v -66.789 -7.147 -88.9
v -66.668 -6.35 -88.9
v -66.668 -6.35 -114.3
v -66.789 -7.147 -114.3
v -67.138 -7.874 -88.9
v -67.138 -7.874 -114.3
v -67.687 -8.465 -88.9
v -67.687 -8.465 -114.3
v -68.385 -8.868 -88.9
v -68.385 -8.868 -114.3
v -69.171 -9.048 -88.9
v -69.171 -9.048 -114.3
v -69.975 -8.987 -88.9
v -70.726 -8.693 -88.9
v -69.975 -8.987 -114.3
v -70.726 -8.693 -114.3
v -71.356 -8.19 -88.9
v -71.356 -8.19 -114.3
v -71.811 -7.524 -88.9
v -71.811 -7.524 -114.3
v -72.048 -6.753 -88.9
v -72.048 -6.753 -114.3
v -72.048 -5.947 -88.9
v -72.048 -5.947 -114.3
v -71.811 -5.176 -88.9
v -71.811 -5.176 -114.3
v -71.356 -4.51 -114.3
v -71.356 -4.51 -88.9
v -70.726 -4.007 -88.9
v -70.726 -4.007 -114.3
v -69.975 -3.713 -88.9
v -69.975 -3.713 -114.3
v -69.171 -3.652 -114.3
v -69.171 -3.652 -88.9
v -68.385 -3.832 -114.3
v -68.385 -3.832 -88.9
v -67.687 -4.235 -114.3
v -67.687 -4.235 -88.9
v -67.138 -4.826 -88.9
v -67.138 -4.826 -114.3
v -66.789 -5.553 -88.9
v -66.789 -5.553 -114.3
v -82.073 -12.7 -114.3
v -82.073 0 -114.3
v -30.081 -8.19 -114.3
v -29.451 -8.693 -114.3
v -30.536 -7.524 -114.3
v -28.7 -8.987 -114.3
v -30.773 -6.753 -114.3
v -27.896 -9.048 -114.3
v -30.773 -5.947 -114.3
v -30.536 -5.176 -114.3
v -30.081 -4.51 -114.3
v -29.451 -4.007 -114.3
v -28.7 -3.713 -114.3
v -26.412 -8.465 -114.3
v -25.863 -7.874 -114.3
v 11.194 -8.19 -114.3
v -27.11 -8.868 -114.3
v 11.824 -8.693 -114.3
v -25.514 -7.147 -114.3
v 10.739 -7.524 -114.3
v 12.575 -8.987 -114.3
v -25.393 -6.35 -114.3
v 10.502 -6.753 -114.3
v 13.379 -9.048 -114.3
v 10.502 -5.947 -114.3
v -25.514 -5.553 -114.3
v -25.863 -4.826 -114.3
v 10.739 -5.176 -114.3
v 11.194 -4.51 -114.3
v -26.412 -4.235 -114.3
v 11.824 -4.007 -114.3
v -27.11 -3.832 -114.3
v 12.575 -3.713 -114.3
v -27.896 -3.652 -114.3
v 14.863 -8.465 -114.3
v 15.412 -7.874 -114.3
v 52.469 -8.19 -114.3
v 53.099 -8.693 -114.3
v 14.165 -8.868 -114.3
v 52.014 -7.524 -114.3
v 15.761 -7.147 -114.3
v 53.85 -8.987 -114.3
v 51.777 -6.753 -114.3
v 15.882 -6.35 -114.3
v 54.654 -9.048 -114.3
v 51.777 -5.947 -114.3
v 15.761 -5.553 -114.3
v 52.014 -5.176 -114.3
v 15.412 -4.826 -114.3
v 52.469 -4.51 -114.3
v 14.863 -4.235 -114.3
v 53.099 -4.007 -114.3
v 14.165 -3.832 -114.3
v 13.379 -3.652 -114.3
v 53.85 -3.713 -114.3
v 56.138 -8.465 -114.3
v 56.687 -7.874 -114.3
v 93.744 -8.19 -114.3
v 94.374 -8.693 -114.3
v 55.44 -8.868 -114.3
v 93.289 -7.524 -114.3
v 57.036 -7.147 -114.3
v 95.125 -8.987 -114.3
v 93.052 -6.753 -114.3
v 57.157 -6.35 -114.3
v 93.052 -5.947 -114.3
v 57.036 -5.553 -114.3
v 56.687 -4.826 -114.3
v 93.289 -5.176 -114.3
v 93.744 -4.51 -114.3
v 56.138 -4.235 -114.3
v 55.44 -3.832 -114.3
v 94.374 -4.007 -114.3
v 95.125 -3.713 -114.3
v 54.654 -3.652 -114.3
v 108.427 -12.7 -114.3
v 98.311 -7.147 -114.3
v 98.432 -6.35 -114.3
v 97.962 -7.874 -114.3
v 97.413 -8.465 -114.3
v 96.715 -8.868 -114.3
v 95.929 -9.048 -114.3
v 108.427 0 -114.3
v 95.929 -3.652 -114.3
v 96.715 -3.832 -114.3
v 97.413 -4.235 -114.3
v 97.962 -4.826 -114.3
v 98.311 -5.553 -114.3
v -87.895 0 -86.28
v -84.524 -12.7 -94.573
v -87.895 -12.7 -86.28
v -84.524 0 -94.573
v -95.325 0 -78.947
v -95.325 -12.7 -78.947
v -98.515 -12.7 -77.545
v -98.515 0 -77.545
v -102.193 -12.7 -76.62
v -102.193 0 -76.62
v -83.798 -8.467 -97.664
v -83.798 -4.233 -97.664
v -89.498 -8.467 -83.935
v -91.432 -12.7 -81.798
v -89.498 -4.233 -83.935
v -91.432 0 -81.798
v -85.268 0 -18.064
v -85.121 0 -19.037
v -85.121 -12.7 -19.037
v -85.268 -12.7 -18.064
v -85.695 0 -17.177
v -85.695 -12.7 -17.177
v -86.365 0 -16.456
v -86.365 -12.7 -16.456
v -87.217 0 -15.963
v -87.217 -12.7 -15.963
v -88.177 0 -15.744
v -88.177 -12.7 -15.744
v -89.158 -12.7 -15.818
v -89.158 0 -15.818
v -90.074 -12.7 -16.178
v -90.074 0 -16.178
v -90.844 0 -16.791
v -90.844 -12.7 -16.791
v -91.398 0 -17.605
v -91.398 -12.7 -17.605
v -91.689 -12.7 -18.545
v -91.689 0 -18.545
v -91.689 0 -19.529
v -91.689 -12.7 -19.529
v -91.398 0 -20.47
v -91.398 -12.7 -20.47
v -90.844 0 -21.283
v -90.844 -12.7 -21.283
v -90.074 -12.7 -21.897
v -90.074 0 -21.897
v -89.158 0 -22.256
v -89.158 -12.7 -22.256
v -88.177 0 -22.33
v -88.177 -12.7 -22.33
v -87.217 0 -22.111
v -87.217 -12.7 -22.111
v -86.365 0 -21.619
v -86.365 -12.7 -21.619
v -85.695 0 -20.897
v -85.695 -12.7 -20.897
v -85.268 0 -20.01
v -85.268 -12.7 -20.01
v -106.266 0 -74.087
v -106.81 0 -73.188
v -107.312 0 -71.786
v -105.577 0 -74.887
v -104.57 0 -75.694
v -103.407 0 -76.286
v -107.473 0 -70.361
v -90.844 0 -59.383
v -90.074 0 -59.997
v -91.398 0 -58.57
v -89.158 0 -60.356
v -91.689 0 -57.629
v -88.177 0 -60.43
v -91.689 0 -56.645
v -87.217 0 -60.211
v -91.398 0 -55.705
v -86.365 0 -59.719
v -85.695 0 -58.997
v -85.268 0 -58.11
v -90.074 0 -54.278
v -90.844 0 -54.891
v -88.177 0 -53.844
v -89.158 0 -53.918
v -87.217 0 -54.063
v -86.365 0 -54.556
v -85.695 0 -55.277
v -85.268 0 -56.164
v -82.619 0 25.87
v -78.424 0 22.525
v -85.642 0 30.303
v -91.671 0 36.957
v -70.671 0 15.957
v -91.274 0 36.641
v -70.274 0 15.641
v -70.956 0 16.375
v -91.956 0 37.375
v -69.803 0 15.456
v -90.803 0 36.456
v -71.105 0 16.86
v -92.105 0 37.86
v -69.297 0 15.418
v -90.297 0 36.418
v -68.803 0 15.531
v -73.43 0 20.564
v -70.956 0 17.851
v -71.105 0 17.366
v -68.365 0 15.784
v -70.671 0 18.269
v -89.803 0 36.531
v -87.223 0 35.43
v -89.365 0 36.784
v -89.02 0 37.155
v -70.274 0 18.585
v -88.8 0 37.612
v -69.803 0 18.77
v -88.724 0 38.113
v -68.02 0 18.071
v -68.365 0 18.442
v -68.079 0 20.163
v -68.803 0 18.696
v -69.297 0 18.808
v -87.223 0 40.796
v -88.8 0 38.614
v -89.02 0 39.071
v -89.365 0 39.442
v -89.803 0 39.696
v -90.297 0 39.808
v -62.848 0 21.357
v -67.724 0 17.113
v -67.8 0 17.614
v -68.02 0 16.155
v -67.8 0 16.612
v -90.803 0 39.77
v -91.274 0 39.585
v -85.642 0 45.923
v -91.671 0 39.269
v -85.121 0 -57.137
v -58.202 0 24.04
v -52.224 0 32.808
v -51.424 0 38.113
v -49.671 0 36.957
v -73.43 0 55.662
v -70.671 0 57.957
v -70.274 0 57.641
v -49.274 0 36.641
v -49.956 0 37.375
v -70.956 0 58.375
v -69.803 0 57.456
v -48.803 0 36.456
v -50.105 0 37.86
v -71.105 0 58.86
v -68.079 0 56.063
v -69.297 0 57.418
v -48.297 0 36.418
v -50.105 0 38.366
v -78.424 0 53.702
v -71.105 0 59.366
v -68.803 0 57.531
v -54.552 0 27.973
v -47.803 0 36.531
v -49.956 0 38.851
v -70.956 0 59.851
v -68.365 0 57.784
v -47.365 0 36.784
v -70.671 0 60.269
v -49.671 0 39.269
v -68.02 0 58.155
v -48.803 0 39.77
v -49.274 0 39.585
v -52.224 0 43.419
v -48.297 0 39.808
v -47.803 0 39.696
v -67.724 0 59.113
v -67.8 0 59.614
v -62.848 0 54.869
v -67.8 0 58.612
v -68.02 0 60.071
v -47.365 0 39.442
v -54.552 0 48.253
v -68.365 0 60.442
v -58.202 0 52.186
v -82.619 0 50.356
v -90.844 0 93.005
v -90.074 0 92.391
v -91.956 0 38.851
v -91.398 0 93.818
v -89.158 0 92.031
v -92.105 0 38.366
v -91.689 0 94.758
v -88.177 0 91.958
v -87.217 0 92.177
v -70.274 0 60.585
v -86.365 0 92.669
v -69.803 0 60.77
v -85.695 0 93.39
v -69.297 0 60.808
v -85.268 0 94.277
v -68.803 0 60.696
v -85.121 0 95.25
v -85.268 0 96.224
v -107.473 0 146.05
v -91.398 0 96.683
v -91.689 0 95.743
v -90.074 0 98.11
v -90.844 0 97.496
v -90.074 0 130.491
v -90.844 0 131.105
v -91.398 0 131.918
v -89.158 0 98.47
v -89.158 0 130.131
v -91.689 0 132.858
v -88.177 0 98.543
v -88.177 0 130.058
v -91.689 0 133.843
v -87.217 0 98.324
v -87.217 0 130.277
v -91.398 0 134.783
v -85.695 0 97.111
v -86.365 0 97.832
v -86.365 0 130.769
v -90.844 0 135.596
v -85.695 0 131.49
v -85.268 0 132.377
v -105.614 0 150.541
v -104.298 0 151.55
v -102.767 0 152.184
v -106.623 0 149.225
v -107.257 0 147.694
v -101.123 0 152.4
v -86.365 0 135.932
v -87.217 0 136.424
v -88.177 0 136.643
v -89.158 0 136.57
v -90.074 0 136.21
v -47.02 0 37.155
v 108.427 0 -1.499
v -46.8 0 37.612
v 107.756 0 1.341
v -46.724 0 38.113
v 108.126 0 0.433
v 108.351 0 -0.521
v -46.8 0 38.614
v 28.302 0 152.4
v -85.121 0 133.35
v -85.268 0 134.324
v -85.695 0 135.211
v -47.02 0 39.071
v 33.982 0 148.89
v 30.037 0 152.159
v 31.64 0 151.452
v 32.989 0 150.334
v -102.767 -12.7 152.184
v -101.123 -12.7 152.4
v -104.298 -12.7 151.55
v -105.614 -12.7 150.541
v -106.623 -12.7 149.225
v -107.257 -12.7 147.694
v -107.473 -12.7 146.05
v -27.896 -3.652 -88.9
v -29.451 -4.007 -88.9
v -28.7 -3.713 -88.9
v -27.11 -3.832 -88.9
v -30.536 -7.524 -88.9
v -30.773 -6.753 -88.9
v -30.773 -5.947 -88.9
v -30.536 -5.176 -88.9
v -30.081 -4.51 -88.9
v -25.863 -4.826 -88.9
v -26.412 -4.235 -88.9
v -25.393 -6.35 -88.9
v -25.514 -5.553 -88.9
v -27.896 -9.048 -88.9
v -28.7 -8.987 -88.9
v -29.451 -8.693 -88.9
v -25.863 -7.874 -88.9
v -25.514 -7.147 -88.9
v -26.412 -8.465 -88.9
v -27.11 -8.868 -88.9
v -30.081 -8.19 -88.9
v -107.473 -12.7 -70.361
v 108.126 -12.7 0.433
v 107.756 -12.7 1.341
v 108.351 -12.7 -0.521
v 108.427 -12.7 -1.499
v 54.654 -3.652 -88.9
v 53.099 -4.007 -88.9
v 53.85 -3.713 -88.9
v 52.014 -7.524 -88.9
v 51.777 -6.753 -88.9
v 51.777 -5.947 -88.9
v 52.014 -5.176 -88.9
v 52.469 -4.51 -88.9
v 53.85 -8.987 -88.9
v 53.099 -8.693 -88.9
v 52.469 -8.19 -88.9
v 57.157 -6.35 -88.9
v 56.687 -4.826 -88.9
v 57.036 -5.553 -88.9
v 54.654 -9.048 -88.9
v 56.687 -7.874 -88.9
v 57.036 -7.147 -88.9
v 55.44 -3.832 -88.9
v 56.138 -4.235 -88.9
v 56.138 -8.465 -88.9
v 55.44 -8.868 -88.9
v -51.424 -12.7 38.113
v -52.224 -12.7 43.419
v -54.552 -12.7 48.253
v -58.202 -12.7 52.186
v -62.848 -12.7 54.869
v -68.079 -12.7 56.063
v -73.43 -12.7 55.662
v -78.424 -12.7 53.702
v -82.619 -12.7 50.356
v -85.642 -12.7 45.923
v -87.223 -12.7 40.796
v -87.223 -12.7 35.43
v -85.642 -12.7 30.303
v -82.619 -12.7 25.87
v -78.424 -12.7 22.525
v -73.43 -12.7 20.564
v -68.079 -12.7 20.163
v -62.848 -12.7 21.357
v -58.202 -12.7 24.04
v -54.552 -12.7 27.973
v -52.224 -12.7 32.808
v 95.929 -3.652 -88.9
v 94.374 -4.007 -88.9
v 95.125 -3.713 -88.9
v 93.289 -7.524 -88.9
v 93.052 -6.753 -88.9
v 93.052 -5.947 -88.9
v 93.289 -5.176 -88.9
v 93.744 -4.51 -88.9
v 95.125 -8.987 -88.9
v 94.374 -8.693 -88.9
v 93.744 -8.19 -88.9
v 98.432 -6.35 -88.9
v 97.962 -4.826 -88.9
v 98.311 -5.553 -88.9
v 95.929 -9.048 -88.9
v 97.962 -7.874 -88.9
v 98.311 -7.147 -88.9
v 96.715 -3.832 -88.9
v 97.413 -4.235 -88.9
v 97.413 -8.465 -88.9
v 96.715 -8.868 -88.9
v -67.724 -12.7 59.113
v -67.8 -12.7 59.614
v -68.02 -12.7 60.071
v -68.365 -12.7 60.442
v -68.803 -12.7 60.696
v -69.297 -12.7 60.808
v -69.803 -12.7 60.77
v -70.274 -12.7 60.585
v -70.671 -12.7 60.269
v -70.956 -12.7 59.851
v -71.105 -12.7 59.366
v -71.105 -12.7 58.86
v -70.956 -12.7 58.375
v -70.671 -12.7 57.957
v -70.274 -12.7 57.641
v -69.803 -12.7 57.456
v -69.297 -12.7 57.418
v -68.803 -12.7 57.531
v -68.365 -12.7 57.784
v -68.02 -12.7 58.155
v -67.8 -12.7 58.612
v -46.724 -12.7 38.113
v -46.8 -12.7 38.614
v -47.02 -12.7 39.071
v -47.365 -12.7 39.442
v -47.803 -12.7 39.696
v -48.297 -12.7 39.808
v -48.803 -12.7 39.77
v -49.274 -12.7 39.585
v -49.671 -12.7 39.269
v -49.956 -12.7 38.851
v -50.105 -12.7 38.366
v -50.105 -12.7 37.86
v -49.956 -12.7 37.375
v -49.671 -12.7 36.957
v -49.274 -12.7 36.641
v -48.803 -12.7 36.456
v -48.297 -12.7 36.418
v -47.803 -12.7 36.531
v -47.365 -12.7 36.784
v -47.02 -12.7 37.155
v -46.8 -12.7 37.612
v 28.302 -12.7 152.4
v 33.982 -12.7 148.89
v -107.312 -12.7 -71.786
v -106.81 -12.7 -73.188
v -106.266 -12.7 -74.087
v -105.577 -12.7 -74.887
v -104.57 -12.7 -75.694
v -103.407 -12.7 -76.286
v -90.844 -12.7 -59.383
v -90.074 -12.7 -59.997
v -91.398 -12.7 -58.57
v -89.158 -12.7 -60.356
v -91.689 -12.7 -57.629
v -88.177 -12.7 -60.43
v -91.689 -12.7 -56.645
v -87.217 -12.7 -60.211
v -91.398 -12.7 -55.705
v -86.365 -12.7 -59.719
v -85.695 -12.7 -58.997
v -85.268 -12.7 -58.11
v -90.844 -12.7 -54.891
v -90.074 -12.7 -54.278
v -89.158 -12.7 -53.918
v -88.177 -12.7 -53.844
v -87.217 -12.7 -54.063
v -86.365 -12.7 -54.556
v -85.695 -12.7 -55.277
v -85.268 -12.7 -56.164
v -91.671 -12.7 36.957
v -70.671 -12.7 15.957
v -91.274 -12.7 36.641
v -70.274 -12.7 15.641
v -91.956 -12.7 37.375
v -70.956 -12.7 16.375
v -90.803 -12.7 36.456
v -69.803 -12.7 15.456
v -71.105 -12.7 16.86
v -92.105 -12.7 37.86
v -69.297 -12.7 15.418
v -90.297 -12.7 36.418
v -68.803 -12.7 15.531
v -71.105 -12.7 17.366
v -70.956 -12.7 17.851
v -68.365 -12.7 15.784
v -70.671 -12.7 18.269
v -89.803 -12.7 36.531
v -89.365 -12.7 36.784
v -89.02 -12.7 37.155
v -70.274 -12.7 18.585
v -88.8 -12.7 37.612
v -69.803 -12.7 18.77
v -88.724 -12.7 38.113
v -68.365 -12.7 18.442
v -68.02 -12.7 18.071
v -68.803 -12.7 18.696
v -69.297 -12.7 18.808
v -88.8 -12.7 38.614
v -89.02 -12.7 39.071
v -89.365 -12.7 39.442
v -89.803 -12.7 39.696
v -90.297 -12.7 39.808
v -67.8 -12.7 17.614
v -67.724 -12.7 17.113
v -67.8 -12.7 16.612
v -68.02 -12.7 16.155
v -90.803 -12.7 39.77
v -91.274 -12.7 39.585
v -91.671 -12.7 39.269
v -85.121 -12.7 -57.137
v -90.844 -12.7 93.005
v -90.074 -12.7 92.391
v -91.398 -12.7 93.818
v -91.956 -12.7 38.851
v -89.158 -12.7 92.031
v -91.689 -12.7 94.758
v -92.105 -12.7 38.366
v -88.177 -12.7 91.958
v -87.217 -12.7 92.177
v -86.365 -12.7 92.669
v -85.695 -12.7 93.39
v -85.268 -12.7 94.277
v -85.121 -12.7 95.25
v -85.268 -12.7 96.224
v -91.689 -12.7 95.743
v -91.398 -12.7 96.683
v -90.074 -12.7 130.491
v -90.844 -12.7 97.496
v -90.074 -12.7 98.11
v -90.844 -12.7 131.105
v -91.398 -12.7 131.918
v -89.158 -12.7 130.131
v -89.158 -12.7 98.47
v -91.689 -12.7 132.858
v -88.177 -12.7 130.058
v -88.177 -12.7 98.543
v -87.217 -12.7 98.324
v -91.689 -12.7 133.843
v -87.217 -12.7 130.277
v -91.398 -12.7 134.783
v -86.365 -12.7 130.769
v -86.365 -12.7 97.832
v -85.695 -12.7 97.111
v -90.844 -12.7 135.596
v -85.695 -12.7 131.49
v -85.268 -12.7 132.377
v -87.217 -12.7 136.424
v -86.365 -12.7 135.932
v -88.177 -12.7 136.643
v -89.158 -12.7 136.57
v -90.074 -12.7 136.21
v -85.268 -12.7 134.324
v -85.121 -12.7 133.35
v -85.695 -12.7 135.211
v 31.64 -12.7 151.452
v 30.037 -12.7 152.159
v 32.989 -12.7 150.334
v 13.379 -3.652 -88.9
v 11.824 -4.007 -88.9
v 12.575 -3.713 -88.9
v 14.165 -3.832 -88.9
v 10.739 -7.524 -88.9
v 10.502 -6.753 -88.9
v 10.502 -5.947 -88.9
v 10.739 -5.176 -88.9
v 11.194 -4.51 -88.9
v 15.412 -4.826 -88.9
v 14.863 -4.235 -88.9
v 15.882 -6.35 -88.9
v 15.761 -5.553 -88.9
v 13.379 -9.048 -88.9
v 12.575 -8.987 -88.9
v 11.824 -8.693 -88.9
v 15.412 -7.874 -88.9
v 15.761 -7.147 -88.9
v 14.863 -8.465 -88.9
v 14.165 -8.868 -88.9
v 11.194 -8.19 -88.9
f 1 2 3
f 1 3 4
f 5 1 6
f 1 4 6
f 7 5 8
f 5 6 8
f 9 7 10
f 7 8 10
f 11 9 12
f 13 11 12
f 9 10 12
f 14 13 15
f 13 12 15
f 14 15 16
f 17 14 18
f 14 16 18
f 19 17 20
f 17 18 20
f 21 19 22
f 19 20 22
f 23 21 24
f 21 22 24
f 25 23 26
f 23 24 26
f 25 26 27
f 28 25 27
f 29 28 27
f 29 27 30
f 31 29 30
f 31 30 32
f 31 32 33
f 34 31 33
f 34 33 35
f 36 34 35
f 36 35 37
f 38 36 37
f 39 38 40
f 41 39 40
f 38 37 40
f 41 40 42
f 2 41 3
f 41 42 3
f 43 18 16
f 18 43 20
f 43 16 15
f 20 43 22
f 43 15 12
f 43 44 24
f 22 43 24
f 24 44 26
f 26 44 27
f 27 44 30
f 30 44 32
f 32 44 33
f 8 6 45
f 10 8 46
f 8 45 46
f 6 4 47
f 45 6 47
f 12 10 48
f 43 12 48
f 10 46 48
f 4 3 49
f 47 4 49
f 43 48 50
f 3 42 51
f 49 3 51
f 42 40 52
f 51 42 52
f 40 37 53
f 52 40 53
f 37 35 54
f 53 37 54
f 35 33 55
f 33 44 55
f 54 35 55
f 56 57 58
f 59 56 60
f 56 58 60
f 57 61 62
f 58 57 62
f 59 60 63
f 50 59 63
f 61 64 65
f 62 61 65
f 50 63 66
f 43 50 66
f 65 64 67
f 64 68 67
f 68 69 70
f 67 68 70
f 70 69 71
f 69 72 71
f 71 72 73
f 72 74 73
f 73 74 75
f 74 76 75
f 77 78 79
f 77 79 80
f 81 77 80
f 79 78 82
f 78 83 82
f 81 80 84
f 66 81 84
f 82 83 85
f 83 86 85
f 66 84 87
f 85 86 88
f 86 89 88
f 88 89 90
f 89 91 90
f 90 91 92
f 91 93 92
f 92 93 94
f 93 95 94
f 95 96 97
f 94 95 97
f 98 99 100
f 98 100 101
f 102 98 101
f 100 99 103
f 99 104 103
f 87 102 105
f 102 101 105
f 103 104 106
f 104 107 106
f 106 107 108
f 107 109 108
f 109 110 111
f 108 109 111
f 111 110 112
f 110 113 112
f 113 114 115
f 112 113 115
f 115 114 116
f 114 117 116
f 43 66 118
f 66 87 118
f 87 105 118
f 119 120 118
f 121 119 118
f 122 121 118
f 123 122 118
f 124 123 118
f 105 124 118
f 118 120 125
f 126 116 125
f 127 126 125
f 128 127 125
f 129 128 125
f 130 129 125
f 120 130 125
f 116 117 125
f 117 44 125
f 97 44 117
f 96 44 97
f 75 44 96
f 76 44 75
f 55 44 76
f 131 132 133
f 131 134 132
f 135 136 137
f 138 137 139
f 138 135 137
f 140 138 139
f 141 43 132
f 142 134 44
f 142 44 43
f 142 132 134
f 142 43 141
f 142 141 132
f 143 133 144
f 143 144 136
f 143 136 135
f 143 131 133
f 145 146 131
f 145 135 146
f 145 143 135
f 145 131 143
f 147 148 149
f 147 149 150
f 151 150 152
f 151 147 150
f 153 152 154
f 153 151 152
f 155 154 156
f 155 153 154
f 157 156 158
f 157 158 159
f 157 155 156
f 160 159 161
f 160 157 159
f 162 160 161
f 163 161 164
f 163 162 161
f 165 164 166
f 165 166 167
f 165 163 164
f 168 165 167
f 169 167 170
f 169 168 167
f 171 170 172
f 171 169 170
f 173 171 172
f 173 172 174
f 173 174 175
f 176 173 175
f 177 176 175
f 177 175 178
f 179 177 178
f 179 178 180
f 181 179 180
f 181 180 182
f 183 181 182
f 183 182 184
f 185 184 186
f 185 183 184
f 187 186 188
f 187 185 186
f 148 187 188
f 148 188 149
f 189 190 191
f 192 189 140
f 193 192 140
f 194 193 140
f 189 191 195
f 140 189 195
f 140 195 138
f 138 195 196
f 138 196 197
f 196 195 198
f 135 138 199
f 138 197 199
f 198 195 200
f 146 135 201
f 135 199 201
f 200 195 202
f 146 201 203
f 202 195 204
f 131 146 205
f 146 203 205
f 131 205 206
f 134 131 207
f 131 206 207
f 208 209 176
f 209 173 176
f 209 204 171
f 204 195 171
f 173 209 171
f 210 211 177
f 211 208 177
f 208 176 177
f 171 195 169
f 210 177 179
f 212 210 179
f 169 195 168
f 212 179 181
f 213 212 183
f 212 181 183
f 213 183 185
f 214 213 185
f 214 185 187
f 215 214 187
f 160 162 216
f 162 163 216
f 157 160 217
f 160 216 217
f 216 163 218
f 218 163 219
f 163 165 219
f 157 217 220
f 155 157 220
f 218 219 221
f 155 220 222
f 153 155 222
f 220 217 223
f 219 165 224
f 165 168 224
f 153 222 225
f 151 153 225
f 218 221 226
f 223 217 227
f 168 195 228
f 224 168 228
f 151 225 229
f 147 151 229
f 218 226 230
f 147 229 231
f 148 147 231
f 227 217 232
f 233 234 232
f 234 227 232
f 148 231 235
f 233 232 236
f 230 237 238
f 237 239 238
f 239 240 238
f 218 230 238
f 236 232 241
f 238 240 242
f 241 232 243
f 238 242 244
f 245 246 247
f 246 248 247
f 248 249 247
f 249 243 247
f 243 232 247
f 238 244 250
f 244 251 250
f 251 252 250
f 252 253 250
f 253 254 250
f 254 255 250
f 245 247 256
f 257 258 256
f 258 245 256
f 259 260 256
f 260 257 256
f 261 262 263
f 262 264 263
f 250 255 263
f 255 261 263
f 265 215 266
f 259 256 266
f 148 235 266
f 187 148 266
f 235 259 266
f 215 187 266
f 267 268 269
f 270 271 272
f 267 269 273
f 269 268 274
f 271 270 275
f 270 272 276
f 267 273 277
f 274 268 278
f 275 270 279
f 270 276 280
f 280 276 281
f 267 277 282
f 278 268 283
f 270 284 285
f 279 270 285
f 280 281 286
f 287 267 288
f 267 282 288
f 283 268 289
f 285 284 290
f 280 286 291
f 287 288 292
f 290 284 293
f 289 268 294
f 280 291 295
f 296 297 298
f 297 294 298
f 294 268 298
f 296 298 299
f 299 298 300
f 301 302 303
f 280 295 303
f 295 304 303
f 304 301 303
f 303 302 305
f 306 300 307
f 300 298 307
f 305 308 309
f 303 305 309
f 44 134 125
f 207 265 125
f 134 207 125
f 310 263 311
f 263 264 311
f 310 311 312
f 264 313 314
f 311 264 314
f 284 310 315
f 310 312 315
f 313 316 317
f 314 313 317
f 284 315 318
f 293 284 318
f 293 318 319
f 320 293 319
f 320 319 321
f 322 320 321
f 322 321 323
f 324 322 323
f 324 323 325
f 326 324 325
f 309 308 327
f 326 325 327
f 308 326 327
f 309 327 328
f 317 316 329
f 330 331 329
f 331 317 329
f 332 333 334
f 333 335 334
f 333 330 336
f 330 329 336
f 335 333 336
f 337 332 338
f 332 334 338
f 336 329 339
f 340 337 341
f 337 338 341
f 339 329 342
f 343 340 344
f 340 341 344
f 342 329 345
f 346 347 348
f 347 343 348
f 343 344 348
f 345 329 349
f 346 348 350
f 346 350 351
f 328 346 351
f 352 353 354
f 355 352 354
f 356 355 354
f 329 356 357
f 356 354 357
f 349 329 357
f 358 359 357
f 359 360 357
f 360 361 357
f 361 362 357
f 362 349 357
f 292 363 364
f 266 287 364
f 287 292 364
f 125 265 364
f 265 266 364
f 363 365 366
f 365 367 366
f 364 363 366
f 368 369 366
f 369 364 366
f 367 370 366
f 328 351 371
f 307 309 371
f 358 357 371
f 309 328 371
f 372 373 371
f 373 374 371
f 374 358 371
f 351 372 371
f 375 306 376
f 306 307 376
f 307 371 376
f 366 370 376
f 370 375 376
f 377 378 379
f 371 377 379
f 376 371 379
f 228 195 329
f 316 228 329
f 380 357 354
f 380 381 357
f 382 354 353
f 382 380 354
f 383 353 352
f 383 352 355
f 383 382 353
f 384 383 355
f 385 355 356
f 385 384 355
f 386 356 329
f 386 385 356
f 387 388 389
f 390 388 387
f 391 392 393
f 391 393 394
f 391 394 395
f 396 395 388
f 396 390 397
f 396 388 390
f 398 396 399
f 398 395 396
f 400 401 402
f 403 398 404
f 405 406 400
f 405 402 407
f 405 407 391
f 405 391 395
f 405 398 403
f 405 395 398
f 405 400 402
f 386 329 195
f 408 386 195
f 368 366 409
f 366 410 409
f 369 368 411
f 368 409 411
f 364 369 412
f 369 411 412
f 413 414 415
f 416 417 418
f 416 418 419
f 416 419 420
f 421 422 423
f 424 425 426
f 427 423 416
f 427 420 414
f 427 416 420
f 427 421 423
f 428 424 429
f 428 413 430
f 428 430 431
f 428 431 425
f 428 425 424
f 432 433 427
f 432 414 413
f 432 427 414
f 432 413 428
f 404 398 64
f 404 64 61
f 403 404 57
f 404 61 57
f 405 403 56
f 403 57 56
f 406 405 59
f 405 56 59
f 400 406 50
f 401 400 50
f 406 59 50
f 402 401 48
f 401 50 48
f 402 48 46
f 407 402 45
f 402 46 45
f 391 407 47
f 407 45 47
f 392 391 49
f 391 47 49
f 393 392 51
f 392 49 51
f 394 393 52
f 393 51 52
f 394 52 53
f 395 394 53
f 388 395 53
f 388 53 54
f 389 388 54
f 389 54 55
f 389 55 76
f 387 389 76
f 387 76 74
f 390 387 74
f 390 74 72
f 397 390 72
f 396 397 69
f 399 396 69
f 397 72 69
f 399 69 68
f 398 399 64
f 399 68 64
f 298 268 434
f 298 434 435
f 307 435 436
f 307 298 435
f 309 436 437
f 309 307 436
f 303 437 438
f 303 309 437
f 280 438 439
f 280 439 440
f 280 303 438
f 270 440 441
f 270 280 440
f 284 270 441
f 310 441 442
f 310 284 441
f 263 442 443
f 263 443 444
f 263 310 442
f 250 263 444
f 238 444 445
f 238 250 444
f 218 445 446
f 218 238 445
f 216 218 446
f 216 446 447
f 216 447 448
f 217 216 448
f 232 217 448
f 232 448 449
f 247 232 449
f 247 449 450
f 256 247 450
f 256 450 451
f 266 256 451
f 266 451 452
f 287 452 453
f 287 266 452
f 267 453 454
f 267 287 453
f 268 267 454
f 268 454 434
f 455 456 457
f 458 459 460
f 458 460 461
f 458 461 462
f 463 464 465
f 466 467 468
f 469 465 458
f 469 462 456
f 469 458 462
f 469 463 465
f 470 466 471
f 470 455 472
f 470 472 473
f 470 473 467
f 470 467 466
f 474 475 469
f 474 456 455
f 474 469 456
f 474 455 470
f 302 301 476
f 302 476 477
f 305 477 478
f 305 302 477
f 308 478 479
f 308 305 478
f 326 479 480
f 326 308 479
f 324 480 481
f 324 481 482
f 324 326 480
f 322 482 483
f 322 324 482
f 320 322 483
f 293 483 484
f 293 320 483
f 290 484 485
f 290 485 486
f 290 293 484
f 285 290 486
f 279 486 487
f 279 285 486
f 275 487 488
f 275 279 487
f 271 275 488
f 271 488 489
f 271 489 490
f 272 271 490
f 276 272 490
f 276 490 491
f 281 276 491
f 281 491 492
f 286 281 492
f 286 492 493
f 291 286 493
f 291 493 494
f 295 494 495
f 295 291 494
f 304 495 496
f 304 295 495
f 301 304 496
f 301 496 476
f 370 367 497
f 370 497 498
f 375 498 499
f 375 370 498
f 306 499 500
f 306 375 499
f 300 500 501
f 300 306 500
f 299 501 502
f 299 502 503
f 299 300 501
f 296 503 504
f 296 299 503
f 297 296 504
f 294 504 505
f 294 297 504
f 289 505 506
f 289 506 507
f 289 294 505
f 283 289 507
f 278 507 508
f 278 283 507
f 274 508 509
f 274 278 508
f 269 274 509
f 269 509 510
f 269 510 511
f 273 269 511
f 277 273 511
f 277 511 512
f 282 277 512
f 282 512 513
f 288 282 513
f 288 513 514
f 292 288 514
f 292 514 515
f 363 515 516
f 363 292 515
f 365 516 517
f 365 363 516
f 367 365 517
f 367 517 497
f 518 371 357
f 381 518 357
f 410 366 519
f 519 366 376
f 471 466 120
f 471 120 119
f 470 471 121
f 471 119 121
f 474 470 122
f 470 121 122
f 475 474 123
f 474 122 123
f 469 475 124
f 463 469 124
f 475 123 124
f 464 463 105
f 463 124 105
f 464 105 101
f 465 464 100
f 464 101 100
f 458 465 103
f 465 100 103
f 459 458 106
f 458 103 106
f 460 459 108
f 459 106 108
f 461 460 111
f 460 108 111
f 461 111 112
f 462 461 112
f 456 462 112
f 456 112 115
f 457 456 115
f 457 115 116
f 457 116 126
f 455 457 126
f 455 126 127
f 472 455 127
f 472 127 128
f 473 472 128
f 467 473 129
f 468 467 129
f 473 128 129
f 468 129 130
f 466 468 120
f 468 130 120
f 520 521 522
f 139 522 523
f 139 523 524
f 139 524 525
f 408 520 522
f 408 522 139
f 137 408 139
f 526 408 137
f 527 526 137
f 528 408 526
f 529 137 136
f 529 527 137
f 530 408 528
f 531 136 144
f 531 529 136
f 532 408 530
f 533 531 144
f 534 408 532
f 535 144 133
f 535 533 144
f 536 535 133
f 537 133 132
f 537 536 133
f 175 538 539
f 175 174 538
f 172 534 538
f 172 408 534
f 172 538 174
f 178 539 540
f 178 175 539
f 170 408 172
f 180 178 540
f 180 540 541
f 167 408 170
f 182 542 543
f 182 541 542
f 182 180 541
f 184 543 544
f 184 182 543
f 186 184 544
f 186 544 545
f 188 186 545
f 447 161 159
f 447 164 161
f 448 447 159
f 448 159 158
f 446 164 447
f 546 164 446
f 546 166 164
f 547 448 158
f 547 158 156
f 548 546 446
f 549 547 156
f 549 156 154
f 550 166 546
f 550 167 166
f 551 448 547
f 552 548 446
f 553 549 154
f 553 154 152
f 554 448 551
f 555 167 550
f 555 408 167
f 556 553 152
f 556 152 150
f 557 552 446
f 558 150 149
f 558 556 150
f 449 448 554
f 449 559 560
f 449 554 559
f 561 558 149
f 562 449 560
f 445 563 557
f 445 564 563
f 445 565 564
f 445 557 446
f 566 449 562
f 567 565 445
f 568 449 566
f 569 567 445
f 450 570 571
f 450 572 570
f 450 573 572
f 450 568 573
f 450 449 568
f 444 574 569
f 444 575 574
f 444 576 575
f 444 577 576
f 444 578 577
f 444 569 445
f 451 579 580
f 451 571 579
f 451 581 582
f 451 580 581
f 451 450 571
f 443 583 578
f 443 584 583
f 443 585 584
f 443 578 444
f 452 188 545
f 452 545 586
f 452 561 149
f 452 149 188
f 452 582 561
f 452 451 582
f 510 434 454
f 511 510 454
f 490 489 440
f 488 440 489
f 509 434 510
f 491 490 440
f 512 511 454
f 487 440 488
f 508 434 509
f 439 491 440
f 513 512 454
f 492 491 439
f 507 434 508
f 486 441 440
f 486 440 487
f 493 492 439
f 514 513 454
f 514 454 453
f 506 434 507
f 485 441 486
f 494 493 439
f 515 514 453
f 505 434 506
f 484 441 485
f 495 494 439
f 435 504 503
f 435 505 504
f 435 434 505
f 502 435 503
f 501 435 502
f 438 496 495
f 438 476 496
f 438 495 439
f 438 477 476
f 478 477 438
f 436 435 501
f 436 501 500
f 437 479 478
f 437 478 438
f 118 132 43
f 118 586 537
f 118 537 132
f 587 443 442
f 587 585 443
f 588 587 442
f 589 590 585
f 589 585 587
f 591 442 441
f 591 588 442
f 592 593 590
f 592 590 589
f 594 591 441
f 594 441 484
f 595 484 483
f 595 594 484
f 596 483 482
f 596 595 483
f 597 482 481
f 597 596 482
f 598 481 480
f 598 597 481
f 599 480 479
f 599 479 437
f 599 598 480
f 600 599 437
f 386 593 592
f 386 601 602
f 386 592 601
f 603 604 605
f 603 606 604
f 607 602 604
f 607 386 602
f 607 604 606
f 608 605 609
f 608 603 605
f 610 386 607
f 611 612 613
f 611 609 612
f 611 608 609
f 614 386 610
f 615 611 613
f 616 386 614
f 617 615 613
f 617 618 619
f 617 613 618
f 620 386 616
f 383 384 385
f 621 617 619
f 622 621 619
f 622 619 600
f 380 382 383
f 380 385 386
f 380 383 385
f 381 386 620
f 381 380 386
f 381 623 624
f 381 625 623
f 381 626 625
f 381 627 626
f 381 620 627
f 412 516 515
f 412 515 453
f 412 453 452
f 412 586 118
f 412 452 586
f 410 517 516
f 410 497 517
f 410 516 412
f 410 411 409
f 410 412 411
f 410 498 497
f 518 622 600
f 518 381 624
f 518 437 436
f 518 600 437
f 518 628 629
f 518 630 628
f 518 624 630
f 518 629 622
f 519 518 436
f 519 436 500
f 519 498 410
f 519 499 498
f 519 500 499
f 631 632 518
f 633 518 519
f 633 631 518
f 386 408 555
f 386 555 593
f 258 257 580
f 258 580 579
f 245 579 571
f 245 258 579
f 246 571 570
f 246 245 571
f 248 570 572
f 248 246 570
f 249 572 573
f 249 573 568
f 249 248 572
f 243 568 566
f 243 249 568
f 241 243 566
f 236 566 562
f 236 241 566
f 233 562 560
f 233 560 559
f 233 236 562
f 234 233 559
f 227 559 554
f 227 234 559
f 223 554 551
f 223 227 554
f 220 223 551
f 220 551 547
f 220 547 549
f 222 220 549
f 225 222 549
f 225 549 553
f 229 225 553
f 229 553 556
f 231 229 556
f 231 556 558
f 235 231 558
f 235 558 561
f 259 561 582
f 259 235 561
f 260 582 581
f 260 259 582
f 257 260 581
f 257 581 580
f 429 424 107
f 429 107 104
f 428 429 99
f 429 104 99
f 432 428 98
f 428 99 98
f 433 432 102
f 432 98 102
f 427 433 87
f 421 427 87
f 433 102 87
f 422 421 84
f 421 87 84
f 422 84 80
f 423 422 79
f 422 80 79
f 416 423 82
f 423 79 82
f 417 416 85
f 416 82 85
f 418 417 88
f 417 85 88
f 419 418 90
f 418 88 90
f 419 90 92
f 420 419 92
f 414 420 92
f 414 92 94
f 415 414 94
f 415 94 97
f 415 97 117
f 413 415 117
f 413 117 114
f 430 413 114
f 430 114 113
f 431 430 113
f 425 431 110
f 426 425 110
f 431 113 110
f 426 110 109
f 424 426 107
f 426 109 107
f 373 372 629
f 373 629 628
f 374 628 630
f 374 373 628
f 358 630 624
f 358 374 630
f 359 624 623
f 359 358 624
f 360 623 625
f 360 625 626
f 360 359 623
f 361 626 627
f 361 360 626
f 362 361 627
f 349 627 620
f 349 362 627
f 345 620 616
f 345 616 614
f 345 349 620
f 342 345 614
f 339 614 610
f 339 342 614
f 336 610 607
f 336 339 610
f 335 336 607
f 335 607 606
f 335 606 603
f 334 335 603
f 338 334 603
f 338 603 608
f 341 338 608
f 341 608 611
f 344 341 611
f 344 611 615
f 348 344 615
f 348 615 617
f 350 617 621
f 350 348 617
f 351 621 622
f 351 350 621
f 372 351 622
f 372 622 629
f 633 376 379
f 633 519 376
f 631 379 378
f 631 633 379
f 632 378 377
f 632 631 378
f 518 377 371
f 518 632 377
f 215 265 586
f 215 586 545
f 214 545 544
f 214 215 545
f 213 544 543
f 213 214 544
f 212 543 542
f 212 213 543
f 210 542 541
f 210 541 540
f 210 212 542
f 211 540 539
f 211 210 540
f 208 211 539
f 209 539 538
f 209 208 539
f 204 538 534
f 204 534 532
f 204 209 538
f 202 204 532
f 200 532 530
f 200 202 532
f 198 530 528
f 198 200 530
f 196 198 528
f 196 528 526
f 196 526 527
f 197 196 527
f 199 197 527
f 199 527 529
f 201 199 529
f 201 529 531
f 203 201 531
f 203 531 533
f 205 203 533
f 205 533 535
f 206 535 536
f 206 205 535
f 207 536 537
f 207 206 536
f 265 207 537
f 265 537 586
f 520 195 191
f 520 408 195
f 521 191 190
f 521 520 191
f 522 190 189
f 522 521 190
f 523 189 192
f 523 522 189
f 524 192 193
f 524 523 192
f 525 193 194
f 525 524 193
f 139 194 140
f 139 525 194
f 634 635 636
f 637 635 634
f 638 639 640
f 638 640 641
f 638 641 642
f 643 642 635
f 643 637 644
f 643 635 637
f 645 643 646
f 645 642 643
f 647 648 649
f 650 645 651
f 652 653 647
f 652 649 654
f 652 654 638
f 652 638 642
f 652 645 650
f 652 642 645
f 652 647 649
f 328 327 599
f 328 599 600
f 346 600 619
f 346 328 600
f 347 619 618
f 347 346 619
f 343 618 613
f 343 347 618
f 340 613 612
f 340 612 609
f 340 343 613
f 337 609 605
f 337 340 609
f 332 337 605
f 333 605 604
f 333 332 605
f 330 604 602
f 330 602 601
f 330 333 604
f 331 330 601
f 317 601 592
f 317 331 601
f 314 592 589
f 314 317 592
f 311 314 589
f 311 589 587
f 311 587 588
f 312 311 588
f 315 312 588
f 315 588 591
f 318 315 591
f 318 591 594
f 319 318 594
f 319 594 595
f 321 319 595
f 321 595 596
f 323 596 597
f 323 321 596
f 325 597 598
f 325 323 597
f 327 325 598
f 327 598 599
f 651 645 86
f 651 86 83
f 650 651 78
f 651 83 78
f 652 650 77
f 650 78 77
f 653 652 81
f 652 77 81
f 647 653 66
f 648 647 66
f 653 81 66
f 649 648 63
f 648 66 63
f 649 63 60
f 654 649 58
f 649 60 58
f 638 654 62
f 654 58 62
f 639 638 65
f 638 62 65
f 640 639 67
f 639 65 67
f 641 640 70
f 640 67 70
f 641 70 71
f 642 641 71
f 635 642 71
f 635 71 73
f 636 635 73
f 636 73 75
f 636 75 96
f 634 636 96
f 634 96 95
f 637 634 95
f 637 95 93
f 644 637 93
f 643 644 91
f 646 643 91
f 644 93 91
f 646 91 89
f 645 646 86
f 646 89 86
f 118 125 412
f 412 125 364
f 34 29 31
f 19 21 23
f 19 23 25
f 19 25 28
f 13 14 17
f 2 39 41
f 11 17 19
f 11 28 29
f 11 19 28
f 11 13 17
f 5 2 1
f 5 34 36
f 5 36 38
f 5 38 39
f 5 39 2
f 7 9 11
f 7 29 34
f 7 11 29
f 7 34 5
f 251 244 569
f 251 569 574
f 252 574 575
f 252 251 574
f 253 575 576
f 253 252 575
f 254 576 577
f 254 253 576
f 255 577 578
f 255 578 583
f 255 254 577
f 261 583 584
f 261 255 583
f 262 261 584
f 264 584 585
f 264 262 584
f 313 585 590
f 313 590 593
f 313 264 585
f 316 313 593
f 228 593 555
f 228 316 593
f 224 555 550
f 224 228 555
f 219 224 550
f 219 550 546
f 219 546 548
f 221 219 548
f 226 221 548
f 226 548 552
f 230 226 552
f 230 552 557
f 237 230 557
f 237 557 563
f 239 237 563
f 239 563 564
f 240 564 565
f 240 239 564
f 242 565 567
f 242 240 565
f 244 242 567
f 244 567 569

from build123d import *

# Parameters (mm, degrees)
F0_R     = 3.302
F0_R_2   = 1.7
F0_R_3   = 18
F1_DEPTH = 12.7
F2_DEPTH = 25.4
F4_R     = 6.35
F3_R     = 1.7
F5_DEPTH = 12.7
F6_R     = 2.7051
F7_DEPTH = 25.4


# Not quite as in the source:
# - a feature names something its author has since deleted; it is built from what else it names


with BuildPart() as f1:
    # F0 (on Front) → F1 (new body)
    with BuildSketch(Plane.XZ):
        with BuildLine():
            Line((108.4265169831, 0.0004552842), (32.2265169831, 152.4004552842))
            Line((32.2265169831, 152.4004552842), (-107.4734830169, 152.4004552842))
            Line((-107.4734830169, 152.4004552842), (-107.4734830169, -76.1995447158))
            add(Edge.make_bspline(
                [(-82.0734830169, -114.2995447158), (-82.8863746009, -95.7832909802), (-85.4194185281, -76.1871889735), (-107.4734830169, -76.1995447158)],
                knots=[0, 0, 0, 0, 45.7905011984, 45.7905011984, 45.7905011984, 45.7905011984], degree=3))
            Line((-82.0734830169, -114.2995447158), (108.4265169831, -114.2995447158))
            Line((108.4265169831, -114.2995447158), (108.4265169831, 0.0004552842))
        make_face()
        with Locations((-88.4234830169, -57.1371889735)):
            Circle(F0_R, mode=Mode.SUBTRACT)
        with Locations((-88.4234830169, -19.0371889735)):
            Circle(F0_R, mode=Mode.SUBTRACT)
        with Locations((-92.9944827628, 14.5430932346)):
            Circle(F0_R_2, mode=Mode.SUBTRACT)
        with Locations((-69.4244827628, 17.1130932346)):
            Circle(F0_R_2, mode=Mode.SUBTRACT)
        with Locations((-45.8544827628, 14.5430932346)):
            Circle(F0_R_2, mode=Mode.SUBTRACT)
        with Locations((-90.4244827628, 38.1130932346)):
            Circle(F0_R_2, mode=Mode.SUBTRACT)
        with Locations((-69.4244827628, 38.1130932346)):
            Circle(F0_R_3, mode=Mode.SUBTRACT)
        with Locations((-92.9944827628, 61.6830932346)):
            Circle(F0_R_2, mode=Mode.SUBTRACT)
        with Locations((-69.4244827628, 59.1130932346)):
            Circle(F0_R_2, mode=Mode.SUBTRACT)
        with Locations((-48.4244827628, 38.1130932346)):
            Circle(F0_R_2, mode=Mode.SUBTRACT)
        with Locations((-45.8544827628, 61.6830932346)):
            Circle(F0_R_2, mode=Mode.SUBTRACT)
        with Locations((-88.4234830169, 95.2504552842)):
            Circle(F0_R, mode=Mode.SUBTRACT)
        with Locations((-88.4234830169, 133.3504552842)):
            Circle(F0_R, mode=Mode.SUBTRACT)
        with Locations((-92.9944827628, 14.5430932346)):
            Circle(F0_R_2)
        with Locations((-45.8544827628, 61.6830932346)):
            Circle(F0_R_2)
    extrude(amount=F1_DEPTH)

    # F0 (on Front) → F2 (cut)
    with BuildSketch(Plane.XZ):
        with BuildLine():
            add(Edge.make_bspline(
                [(-82.0734830169, -114.2995447158), (-82.8863746009, -95.7832909802), (-85.4194185281, -76.1871889735), (-107.4734830169, -76.1995447158)],
                knots=[0, 0, 0, 0, 45.7905011984, 45.7905011984, 45.7905011984, 45.7905011984], degree=3))
            Line((-107.4734830169, -76.1995447158), (-107.4734830169, -114.2995447158))
            Line((-107.4734830169, -114.2995447158), (-82.0734830169, -114.2995447158))
        make_face()
        with BuildLine():
            Line((108.4265169831, 0.0004552842), (32.2265169831, 152.4004552842))
            Line((32.2265169831, 152.4004552842), (-107.4734830169, 152.4004552842))
            Line((-107.4734830169, 152.4004552842), (-107.4734830169, -76.1995447158))
            add(Edge.make_bspline(
                [(-82.0734830169, -114.2995447158), (-82.8863746009, -95.7832909802), (-85.4194185281, -76.1871889735), (-107.4734830169, -76.1995447158)],
                knots=[0, 0, 0, 0, 45.7905011984, 45.7905011984, 45.7905011984, 45.7905011984], degree=3))
            Line((-82.0734830169, -114.2995447158), (108.4265169831, -114.2995447158))
            Line((108.4265169831, -114.2995447158), (108.4265169831, 0.0004552842))
        make_face()
        with Locations((-88.4234830169, -57.1371889735)):
            Circle(F0_R, mode=Mode.SUBTRACT)
        with Locations((-88.4234830169, -19.0371889735)):
            Circle(F0_R, mode=Mode.SUBTRACT)
        with Locations((-92.9944827628, 14.5430932346)):
            Circle(F0_R_2, mode=Mode.SUBTRACT)
        with Locations((-69.4244827628, 17.1130932346)):
            Circle(F0_R_2, mode=Mode.SUBTRACT)
        with Locations((-45.8544827628, 14.5430932346)):
            Circle(F0_R_2, mode=Mode.SUBTRACT)
        with Locations((-90.4244827628, 38.1130932346)):
            Circle(F0_R_2, mode=Mode.SUBTRACT)
        with Locations((-69.4244827628, 38.1130932346)):
            Circle(F0_R_3, mode=Mode.SUBTRACT)
        with Locations((-92.9944827628, 61.6830932346)):
            Circle(F0_R_2, mode=Mode.SUBTRACT)
        with Locations((-69.4244827628, 59.1130932346)):
            Circle(F0_R_2, mode=Mode.SUBTRACT)
        with Locations((-48.4244827628, 38.1130932346)):
            Circle(F0_R_2, mode=Mode.SUBTRACT)
        with Locations((-45.8544827628, 61.6830932346)):
            Circle(F0_R_2, mode=Mode.SUBTRACT)
        with Locations((-88.4234830169, 95.2504552842)):
            Circle(F0_R, mode=Mode.SUBTRACT)
        with Locations((-88.4234830169, 133.3504552842)):
            Circle(F0_R, mode=Mode.SUBTRACT)
    extrude(amount=-F2_DEPTH, mode=Mode.SUBTRACT)

    # F4
    f4_edges = [f1.edges().sort_by_distance(p)[0] for p in [
        (-107.473483, -6.35, -76.199545),
        (-107.473483, -6.35, 152.400455),
        (108.426517, -6.35, 0.000455),
        (32.226517, -6.35, 152.400455),
    ]]
    fillet(f4_edges, radius=F4_R)

    # F3 (on face) → F5 (join)
    with BuildSketch(Plane.XZ.offset(12.7)):
        with Locations((-45.8544827628, 14.5430932346)):
            Circle(F3_R)
        with Locations((-92.9944827628, 61.6830932346)):
            Circle(F3_R)
    extrude(amount=-F5_DEPTH)

    # F6 (on face) → F7 (cut)
    with BuildSketch(Plane(origin=(0, 0, -114.2995447158), x_dir=(1, 0, 0), z_dir=(0, 0, -1))):
        with Locations((-69.3734830169, 6.35)):
            Circle(F6_R)
        with Locations((-28.0984830169, 6.35)):
            Circle(F6_R)
        with Locations((13.1765169831, 6.35)):
            Circle(F6_R)
        with Locations((54.4515169831, 6.35)):
            Circle(F6_R)
        with Locations((95.7265169831, 6.35)):
            Circle(F6_R)
    extrude(amount=-F7_DEPTH, mode=Mode.SUBTRACT)


solid = f1.part
